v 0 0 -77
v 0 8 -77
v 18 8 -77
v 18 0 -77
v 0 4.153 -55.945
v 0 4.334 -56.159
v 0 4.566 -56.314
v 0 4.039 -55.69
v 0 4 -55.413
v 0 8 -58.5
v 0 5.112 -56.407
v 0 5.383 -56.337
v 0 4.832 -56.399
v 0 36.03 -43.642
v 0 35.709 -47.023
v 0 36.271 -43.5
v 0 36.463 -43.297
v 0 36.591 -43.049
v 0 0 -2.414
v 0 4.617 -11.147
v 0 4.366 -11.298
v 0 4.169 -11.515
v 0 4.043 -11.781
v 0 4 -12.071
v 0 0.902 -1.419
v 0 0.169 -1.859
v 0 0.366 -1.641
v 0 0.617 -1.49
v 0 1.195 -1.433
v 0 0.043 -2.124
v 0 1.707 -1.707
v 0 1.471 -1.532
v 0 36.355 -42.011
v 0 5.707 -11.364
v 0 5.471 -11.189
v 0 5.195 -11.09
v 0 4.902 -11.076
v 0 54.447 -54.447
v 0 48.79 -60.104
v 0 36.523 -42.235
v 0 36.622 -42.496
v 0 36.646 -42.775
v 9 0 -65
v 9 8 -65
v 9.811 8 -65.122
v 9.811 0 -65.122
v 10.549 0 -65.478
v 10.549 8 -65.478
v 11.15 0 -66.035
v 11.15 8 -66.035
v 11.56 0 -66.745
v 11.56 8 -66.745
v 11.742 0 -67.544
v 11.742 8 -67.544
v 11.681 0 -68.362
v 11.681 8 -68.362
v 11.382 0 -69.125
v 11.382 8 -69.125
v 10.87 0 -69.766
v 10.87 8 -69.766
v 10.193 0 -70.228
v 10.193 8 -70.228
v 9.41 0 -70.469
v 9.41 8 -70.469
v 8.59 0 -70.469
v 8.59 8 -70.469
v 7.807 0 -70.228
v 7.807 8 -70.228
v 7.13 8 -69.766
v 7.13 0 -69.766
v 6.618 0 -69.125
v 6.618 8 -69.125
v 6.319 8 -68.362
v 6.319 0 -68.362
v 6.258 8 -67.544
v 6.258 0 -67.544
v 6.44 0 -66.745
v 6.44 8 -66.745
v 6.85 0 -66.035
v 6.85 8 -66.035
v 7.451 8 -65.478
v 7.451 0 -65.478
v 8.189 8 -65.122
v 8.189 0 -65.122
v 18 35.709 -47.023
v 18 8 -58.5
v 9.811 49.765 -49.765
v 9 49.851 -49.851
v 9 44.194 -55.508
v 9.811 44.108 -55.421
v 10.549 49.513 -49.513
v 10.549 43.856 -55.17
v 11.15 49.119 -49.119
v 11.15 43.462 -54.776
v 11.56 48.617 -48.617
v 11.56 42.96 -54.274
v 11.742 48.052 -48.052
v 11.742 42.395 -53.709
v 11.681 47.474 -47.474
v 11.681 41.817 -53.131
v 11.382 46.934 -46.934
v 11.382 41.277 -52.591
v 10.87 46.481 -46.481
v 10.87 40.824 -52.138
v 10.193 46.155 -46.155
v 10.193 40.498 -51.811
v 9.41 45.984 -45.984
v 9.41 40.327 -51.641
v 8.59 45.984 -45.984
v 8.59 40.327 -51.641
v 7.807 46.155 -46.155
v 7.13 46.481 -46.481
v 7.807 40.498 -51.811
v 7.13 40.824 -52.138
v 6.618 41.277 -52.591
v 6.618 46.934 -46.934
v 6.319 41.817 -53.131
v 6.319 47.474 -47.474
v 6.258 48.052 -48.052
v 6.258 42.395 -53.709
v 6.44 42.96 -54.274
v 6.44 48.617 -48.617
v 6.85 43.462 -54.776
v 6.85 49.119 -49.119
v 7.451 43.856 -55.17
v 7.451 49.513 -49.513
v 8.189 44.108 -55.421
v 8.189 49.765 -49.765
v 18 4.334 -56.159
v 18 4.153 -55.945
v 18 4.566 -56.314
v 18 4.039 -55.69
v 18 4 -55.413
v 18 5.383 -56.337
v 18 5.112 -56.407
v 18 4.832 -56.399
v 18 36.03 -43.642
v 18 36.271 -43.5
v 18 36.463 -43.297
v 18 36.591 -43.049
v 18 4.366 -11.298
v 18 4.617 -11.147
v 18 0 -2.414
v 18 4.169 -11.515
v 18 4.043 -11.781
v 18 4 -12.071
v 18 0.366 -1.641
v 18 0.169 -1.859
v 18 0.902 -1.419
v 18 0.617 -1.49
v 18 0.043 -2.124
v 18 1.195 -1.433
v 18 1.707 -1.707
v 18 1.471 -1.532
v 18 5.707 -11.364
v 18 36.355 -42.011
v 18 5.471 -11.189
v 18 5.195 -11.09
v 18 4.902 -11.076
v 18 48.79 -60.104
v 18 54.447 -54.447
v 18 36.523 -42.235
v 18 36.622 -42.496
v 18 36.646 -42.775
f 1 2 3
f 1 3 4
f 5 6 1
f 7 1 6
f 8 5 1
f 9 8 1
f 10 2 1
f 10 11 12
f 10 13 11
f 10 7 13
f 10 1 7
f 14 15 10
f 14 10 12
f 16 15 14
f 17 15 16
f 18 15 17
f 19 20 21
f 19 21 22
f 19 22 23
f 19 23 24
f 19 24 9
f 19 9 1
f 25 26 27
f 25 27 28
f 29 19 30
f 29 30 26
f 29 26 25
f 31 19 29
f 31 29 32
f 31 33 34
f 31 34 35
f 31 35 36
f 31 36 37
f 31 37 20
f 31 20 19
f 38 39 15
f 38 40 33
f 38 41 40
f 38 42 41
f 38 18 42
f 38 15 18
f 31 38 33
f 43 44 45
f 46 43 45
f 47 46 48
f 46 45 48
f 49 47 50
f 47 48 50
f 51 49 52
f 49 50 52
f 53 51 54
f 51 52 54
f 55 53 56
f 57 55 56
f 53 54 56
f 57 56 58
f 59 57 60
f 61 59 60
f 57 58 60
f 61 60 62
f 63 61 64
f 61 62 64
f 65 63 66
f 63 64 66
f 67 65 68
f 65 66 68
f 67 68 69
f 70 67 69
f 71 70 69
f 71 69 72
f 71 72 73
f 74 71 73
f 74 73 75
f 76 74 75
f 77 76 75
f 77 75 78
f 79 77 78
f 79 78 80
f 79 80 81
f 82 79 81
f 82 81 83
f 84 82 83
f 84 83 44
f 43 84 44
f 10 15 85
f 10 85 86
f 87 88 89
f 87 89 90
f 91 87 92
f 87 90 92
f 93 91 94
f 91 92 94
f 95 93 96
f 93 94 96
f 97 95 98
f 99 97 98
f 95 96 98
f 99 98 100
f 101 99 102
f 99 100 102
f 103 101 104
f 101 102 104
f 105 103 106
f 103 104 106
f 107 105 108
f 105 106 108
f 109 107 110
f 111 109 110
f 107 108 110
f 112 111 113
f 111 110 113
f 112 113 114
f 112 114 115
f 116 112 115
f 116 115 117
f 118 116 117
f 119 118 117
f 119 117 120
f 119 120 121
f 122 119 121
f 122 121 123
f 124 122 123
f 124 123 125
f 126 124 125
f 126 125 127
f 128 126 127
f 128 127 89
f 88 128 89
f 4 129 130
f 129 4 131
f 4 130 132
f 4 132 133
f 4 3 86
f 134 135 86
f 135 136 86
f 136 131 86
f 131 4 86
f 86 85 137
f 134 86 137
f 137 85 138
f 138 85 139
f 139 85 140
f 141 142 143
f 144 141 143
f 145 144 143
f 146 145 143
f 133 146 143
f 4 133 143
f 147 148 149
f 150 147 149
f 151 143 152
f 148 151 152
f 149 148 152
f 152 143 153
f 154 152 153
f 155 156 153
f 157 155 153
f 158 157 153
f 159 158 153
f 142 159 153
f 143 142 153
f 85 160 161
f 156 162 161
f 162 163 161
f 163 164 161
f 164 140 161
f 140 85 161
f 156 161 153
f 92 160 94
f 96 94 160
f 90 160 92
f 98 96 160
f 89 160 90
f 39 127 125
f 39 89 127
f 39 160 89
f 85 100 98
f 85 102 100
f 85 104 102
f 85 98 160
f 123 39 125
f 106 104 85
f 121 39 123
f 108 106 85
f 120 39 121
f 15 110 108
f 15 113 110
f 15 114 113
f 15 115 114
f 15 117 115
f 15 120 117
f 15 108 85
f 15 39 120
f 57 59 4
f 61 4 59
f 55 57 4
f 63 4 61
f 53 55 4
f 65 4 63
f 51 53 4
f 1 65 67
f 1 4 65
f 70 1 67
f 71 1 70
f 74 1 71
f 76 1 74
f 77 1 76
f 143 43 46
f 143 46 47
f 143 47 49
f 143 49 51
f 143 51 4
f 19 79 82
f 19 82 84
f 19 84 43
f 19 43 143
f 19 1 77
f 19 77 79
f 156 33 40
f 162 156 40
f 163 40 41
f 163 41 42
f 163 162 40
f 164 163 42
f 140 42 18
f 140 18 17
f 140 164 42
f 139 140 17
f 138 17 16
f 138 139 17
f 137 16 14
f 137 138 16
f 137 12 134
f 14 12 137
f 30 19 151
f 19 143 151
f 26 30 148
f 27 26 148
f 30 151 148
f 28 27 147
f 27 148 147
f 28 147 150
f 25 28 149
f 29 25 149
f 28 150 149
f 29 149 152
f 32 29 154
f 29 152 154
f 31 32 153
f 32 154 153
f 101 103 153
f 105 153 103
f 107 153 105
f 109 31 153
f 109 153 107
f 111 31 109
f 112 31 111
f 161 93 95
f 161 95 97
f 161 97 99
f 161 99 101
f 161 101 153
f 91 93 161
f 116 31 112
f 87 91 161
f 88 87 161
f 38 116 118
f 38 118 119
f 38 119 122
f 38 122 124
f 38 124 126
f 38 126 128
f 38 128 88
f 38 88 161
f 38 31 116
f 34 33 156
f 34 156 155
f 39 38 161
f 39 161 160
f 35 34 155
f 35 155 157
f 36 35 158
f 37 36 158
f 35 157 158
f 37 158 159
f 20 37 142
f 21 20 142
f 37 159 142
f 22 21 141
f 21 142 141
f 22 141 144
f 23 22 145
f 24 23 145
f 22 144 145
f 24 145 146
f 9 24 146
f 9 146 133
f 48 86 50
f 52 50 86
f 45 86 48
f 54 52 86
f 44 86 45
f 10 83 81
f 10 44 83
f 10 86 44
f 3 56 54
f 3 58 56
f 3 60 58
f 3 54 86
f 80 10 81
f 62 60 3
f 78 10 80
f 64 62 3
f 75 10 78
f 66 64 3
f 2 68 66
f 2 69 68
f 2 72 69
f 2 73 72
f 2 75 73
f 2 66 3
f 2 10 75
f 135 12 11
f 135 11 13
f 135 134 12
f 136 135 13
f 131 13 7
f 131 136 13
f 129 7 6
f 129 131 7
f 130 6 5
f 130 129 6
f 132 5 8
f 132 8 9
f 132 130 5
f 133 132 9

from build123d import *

# Parameters (mm, degrees)
EXTRUDE_2_DEPTH     = 18
FILLET_2_R          = 1
CUT_EXTRUDE_1_REACH = 93.708
SKETCH_2_R          = 2.75
CUT_EXTRUDE_2_REACH = 97.007
SKETCH_3_R          = 2.75


with BuildPart() as part:
    # 草图1 → 凸台-拉伸2 (new body)
    with BuildSketch(Plane(origin=(0, 0, 0), x_dir=(0, 0, -1), z_dir=(1, 0, 0))):
        Polygon((77, 0), (0, 0), (54.447222151, 54.447222151), (60.104076401, 48.790367902), (47.022600949, 35.70889245), (58.5, 8), (77, 8), align=None)
        Polygon((9.656854249, 4), (56.909677649, 4), (43.069646105, 37.412791856), align=None, mode=Mode.SUBTRACT)
    extrude(amount=EXTRUDE_2_DEPTH)

    # 圆角2
    fillet_2_edges = [part.edges().sort_by_distance(p)[0] for p in [
        (9, 0, 0),
        (9, 37.412791856, -43.069646105),
        (9, 4, -9.656854249),
        (9, 4, -56.909677649),
    ]]
    fillet(fillet_2_edges, radius=FILLET_2_R)

    # 草图2 → 切除-拉伸1 (cut, up to next)
    with BuildSketch(Plane(origin=(0, 8, 0), x_dir=(1, 0, 0), z_dir=(0, 1, 0)), mode=Mode.PRIVATE) as cut_extrude_1_sk1:
        with Locations(Location((9, 67.75, 0), (0, 0, 270))):
            Circle(SKETCH_2_R)
    cut_extrude_1_tool1 = extrude(cut_extrude_1_sk1.sketch, amount=-CUT_EXTRUDE_1_REACH, mode=Mode.PRIVATE) & part.part
    add(cut_extrude_1_tool1.solids().sort_by_distance((9, 8, -67.75))[0], mode=Mode.SUBTRACT)

    # 草图3 → 切除-拉伸2 (cut, up to next)
    with BuildSketch(Plane(origin=(0, -5.656854249, -5.656854249), x_dir=(1, 0, 0), z_dir=(0, -0.7071067811865509, -0.7071067811865441)), mode=Mode.PRIVATE) as cut_extrude_2_sk1:
        with Locations(Location((9, -67.75, 0), (0, 0, 270))):
            Circle(SKETCH_3_R)
    cut_extrude_2_tool1 = extrude(cut_extrude_2_sk1.sketch, amount=-CUT_EXTRUDE_2_REACH, mode=Mode.PRIVATE) & part.part
    add(cut_extrude_2_tool1.solids().sort_by_distance((9, 42.24963, -53.563339))[0], mode=Mode.SUBTRACT)


solid = part.part
